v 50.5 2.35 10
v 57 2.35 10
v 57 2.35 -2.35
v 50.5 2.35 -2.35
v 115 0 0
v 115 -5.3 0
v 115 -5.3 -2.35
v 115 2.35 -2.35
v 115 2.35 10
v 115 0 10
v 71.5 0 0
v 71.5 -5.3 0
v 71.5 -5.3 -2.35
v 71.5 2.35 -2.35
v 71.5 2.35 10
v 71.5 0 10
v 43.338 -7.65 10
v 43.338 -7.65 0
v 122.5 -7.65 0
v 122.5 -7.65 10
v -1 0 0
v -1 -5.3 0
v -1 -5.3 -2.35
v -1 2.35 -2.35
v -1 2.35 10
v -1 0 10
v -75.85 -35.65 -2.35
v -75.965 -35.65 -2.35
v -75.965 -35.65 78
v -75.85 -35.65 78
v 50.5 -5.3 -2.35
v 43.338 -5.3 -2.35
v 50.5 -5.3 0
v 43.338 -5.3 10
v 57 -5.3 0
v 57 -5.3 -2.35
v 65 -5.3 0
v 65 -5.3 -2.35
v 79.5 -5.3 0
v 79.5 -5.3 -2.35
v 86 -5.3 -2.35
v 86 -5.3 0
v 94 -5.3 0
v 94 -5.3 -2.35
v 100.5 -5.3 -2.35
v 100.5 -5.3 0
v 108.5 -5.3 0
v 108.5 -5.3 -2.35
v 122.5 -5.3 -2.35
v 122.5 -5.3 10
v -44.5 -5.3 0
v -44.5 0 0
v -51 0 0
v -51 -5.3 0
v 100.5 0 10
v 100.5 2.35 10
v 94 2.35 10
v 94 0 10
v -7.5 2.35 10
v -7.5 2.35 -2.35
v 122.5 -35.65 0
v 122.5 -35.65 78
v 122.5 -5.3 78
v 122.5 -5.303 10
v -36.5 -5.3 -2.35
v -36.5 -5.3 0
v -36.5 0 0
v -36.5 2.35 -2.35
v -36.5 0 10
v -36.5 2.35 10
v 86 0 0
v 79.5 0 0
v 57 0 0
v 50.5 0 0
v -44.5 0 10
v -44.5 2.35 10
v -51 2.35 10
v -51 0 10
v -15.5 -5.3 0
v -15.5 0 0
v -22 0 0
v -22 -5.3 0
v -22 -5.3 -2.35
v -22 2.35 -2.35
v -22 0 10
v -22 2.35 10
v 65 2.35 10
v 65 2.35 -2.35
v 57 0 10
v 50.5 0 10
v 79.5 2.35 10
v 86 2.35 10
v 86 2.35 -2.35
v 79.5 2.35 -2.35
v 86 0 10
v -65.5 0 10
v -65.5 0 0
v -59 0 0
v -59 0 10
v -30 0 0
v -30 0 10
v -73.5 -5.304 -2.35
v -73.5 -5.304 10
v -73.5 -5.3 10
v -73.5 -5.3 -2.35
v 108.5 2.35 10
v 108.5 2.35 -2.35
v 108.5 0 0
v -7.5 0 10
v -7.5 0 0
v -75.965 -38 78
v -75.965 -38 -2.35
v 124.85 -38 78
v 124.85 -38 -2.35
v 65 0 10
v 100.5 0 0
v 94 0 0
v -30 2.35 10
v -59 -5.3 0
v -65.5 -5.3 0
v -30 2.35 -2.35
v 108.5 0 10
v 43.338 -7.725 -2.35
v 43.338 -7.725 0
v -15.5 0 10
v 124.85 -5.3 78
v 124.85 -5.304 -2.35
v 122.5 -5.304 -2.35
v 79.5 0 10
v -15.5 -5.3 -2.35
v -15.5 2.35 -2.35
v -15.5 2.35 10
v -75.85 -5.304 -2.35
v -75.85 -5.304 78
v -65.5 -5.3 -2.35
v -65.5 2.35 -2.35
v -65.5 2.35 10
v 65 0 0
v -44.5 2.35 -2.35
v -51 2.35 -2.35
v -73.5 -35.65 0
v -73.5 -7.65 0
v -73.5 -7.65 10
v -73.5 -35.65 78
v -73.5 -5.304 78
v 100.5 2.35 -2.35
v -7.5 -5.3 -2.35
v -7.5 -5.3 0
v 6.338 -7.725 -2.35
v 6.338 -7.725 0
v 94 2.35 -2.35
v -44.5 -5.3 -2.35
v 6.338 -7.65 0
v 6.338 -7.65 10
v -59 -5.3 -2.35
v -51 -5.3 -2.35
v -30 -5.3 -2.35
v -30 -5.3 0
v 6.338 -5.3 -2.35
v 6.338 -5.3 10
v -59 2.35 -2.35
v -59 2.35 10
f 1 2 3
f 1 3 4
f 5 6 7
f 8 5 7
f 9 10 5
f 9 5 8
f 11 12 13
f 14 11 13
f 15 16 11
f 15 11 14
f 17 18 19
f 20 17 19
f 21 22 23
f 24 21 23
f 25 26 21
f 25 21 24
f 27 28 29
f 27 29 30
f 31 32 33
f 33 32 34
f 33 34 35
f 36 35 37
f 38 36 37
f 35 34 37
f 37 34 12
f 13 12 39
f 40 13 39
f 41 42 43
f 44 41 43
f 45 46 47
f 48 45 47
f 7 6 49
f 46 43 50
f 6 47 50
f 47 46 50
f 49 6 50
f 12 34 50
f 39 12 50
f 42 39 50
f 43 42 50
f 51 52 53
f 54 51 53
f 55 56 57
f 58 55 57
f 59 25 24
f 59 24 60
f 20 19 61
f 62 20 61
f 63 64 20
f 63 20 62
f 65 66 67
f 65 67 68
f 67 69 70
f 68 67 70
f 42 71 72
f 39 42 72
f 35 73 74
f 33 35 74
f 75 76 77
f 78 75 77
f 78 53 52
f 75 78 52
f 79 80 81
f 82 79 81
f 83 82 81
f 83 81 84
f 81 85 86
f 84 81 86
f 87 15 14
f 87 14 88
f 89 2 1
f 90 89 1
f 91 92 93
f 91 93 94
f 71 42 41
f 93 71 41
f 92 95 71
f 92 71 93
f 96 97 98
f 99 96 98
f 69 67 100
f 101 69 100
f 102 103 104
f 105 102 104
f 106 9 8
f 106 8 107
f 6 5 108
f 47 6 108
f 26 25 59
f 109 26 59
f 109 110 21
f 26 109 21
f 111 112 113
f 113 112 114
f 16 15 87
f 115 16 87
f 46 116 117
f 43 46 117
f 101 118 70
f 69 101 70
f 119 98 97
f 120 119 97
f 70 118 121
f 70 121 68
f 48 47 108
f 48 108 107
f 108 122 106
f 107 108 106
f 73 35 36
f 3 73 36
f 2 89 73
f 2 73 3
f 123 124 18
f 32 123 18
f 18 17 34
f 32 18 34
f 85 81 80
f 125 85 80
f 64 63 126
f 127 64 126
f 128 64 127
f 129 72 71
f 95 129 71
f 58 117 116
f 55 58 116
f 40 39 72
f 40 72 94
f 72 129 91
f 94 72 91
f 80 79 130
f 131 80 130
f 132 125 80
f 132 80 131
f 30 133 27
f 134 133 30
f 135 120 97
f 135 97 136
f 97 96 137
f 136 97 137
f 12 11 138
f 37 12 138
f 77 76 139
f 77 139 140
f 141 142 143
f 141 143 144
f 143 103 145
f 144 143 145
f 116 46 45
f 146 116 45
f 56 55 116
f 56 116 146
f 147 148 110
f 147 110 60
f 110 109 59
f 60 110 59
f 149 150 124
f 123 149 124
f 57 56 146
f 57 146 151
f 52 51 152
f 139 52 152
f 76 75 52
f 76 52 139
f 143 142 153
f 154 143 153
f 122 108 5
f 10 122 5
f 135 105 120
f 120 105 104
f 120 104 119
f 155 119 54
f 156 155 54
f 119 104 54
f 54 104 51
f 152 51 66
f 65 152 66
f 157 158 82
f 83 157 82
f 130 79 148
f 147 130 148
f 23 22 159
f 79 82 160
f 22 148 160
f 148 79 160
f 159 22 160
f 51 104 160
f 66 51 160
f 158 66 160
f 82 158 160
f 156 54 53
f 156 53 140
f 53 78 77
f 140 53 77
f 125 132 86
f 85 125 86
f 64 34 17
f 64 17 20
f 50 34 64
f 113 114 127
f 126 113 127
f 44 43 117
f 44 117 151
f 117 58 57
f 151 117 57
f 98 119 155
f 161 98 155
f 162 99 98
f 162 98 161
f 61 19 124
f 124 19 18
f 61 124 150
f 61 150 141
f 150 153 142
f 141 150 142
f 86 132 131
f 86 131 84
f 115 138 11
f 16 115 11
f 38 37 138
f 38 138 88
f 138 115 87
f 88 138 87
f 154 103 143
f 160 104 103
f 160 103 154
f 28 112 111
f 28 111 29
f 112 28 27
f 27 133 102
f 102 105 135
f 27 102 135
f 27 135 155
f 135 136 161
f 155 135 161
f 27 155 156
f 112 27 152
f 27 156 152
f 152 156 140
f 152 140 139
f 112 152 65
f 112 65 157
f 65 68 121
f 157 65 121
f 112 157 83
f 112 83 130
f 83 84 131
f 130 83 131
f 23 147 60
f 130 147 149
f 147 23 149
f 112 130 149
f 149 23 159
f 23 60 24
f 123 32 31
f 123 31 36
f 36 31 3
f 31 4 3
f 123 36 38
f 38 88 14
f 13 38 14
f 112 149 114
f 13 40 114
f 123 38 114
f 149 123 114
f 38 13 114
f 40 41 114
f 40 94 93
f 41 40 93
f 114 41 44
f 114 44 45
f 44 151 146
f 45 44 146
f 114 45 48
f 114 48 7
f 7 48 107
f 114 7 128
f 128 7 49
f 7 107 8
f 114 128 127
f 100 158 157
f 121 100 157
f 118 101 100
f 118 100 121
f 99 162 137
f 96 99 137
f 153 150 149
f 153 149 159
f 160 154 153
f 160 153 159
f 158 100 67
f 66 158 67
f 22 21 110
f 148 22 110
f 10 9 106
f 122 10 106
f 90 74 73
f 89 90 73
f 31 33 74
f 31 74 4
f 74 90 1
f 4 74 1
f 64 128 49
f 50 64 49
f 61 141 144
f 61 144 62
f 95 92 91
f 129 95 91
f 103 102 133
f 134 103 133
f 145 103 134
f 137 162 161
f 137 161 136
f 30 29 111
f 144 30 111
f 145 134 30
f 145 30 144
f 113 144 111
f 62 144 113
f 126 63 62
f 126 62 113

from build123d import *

# Parameters (mm, degrees)
BOSS_EXTRU_1_DEPTH      = 10
ESQUISSE1_W             = 196
ESQUISSE1_H             = 2.35
BOSS_EXTRU_1_2_DEPTH    = 10
ESQUISSE2_W             = 196
ESQUISSE2_H             = 38
BOSS_EXTRU_2_DEPTH      = 2.35
ESQUISSE3_W             = 80.35
ESQUISSE3_H             = 30.346426361
BOSS_EXTRU_4_DEPTH      = 2.35
BOSS_EXTRU_5_DEPTH      = 2.35
BOSS_EXTRU_6_DEPTH      = 68
BOSS_EXTRU_6_DEPTH_BACK = 12.35
ESQUISSE6_W             = 200.815081418
ESQUISSE6_H             = 2.35
ESQUISSE7_W             = 8
ESQUISSE7_H             = 7.65
ENL_V_MAT_EXTRU_1_DEPTH = 13
ESQUISSE9_W             = 37
ESQUISSE9_H             = 12
ENL_V_MAT_EXTRU_2_DEPTH = 13


with BuildPart() as part:
    # Esquisse1 → Boss.-Extru.1 (new body)
    with BuildSketch(Plane.XY):
        Polygon((122.5, 2.35), (122.5, 0), (0, 0), (-73.5, 0), (-73.5, 2.35), align=None)
    extrude(amount=BOSS_EXTRU_1_DEPTH)



with BuildPart() as body_2:
    # Esquisse1 → Boss.-Extru.1 2 (new body)
    with BuildSketch(Plane.XY):
        with Locations((24.5, -6.475)):
            Rectangle(ESQUISSE1_W, ESQUISSE1_H)
    extrude(amount=BOSS_EXTRU_1_2_DEPTH)


with BuildPart() as part_1:
    add(part.part)

    add(body_2.part)  # Boss.-Extru.2 merges body 2
    # Esquisse2 → Boss.-Extru.2 (add)
    with BuildSketch(Plane(origin=(0, 0, 0), x_dir=(-1, 0, 0), z_dir=(0, 0, -1))):
        with Locations((-24.5, -16.65)):
            Rectangle(ESQUISSE2_W, ESQUISSE2_H)
    extrude(amount=BOSS_EXTRU_2_DEPTH)

    # Esquisse3 → Boss.-Extru.4 (add)
    with BuildSketch(Plane.ZY.offset(73.5)):
        with Locations((37.825, -20.47678682)):
            Rectangle(ESQUISSE3_W, ESQUISSE3_H)
    extrude(amount=BOSS_EXTRU_4_DEPTH)

    # Esquisse5 → Boss.-Extru.5 (add)
    with BuildSketch(Plane(origin=(122.5, 0, 0), x_dir=(0, 0, -1), z_dir=(1, 0, 0))):
        Polygon((-78, -5.3), (2.35, -5.303573639), (2.35, -35.65), (-78, -35.65), align=None)
    extrude(amount=BOSS_EXTRU_5_DEPTH)

    # Esquisse6 → Boss.-Extru.6 (add, two sides: drawn at the far end of the back side and taken through both)
    with BuildSketch(Plane.XY.offset(10).offset(-BOSS_EXTRU_6_DEPTH_BACK)):
        with Locations((24.442459291, -36.825)):
            Rectangle(ESQUISSE6_W, ESQUISSE6_H)
    extrude(amount=BOSS_EXTRU_6_DEPTH + BOSS_EXTRU_6_DEPTH_BACK)

    # Esquisse7 → Enlèv. mat.-Extru.1 (cut)
    with BuildSketch(Plane.XY.offset(10)):
        with Locations((-69.5, -1.475)):
            Rectangle(ESQUISSE7_W, ESQUISSE7_H)
        with Locations((-55, -1.475)):
            Rectangle(ESQUISSE7_W, ESQUISSE7_H)
        with Locations((-40.5, -1.475)):
            Rectangle(ESQUISSE7_W, ESQUISSE7_H)
        with Locations((-26, -1.475)):
            Rectangle(ESQUISSE7_W, ESQUISSE7_H)
        with Locations((-11.5, -1.475)):
            Rectangle(ESQUISSE7_W, ESQUISSE7_H)
        with Locations((3, -1.475)):
            Rectangle(ESQUISSE7_W, ESQUISSE7_H)
        with Locations((17.5, -1.475)):
            Rectangle(ESQUISSE7_W, ESQUISSE7_H)
        with Locations((32, -1.475)):
            Rectangle(ESQUISSE7_W, ESQUISSE7_H)
        with Locations((46.5, -1.475)):
            Rectangle(ESQUISSE7_W, ESQUISSE7_H)
        with Locations((61, -1.475)):
            Rectangle(ESQUISSE7_W, ESQUISSE7_H)
        with Locations((75.5, -1.475)):
            Rectangle(ESQUISSE7_W, ESQUISSE7_H)
        with Locations((90, -1.475)):
            Rectangle(ESQUISSE7_W, ESQUISSE7_H)
        with Locations((104.5, -1.475)):
            Rectangle(ESQUISSE7_W, ESQUISSE7_H)
        with Locations((119, -1.475)):
            Rectangle(ESQUISSE7_W, ESQUISSE7_H)
        with Locations((133.5, -1.475)):
            Rectangle(ESQUISSE7_W, ESQUISSE7_H)
        with Locations((148, -1.475)):
            Rectangle(ESQUISSE7_W, ESQUISSE7_H)
        with Locations((162.5, -1.475)):
            Rectangle(ESQUISSE7_W, ESQUISSE7_H)
        with Locations((177, -1.475)):
            Rectangle(ESQUISSE7_W, ESQUISSE7_H)
        with Locations((191.5, -1.475)):
            Rectangle(ESQUISSE7_W, ESQUISSE7_H)
        with Locations((206, -1.475)):
            Rectangle(ESQUISSE7_W, ESQUISSE7_H)
        with Locations((220.5, -1.475)):
            Rectangle(ESQUISSE7_W, ESQUISSE7_H)
        with Locations((235, -1.475)):
            Rectangle(ESQUISSE7_W, ESQUISSE7_H)
        with Locations((249.5, -1.475)):
            Rectangle(ESQUISSE7_W, ESQUISSE7_H)
        with Locations((264, -1.475)):
            Rectangle(ESQUISSE7_W, ESQUISSE7_H)
        with Locations((278.5, -1.475)):
            Rectangle(ESQUISSE7_W, ESQUISSE7_H)
        with Locations((293, -1.475)):
            Rectangle(ESQUISSE7_W, ESQUISSE7_H)
        with Locations((307.5, -1.475)):
            Rectangle(ESQUISSE7_W, ESQUISSE7_H)
        with Locations((322, -1.475)):
            Rectangle(ESQUISSE7_W, ESQUISSE7_H)
        with Locations((336.5, -1.475)):
            Rectangle(ESQUISSE7_W, ESQUISSE7_H)
        with Locations((351, -1.475)):
            Rectangle(ESQUISSE7_W, ESQUISSE7_H)
        with Locations((365.5, -1.475)):
            Rectangle(ESQUISSE7_W, ESQUISSE7_H)
        with Locations((380, -1.475)):
            Rectangle(ESQUISSE7_W, ESQUISSE7_H)
        with Locations((394.5, -1.475)):
            Rectangle(ESQUISSE7_W, ESQUISSE7_H)
        with Locations((409, -1.475)):
            Rectangle(ESQUISSE7_W, ESQUISSE7_H)
        with Locations((423.5, -1.475)):
            Rectangle(ESQUISSE7_W, ESQUISSE7_H)
        with Locations((438, -1.475)):
            Rectangle(ESQUISSE7_W, ESQUISSE7_H)
        with Locations((452.5, -1.475)):
            Rectangle(ESQUISSE7_W, ESQUISSE7_H)
        with Locations((467, -1.475)):
            Rectangle(ESQUISSE7_W, ESQUISSE7_H)
        with Locations((481.5, -1.475)):
            Rectangle(ESQUISSE7_W, ESQUISSE7_H)
        with Locations((496, -1.475)):
            Rectangle(ESQUISSE7_W, ESQUISSE7_H)
        with Locations((510.5, -1.475)):
            Rectangle(ESQUISSE7_W, ESQUISSE7_H)
        with Locations((525, -1.475)):
            Rectangle(ESQUISSE7_W, ESQUISSE7_H)
        with Locations((539.5, -1.475)):
            Rectangle(ESQUISSE7_W, ESQUISSE7_H)
        with Locations((554, -1.475)):
            Rectangle(ESQUISSE7_W, ESQUISSE7_H)
        with Locations((568.5, -1.475)):
            Rectangle(ESQUISSE7_W, ESQUISSE7_H)
        with Locations((583, -1.475)):
            Rectangle(ESQUISSE7_W, ESQUISSE7_H)
        with Locations((597.5, -1.475)):
            Rectangle(ESQUISSE7_W, ESQUISSE7_H)
        with Locations((612, -1.475)):
            Rectangle(ESQUISSE7_W, ESQUISSE7_H)
        with Locations((626.5, -1.475)):
            Rectangle(ESQUISSE7_W, ESQUISSE7_H)
        with Locations((641, -1.475)):
            Rectangle(ESQUISSE7_W, ESQUISSE7_H)
    extrude(amount=-ENL_V_MAT_EXTRU_1_DEPTH, mode=Mode.SUBTRACT)

    # Esquisse9 → Enlèv. mat.-Extru.2 (cut)
    with BuildSketch(Plane.XY.offset(10)):
        with Locations((24.838183524, -1.725435405)):
            Rectangle(ESQUISSE9_W, ESQUISSE9_H)
    extrude(amount=-ENL_V_MAT_EXTRU_2_DEPTH, mode=Mode.SUBTRACT)


solid = part_1.part
